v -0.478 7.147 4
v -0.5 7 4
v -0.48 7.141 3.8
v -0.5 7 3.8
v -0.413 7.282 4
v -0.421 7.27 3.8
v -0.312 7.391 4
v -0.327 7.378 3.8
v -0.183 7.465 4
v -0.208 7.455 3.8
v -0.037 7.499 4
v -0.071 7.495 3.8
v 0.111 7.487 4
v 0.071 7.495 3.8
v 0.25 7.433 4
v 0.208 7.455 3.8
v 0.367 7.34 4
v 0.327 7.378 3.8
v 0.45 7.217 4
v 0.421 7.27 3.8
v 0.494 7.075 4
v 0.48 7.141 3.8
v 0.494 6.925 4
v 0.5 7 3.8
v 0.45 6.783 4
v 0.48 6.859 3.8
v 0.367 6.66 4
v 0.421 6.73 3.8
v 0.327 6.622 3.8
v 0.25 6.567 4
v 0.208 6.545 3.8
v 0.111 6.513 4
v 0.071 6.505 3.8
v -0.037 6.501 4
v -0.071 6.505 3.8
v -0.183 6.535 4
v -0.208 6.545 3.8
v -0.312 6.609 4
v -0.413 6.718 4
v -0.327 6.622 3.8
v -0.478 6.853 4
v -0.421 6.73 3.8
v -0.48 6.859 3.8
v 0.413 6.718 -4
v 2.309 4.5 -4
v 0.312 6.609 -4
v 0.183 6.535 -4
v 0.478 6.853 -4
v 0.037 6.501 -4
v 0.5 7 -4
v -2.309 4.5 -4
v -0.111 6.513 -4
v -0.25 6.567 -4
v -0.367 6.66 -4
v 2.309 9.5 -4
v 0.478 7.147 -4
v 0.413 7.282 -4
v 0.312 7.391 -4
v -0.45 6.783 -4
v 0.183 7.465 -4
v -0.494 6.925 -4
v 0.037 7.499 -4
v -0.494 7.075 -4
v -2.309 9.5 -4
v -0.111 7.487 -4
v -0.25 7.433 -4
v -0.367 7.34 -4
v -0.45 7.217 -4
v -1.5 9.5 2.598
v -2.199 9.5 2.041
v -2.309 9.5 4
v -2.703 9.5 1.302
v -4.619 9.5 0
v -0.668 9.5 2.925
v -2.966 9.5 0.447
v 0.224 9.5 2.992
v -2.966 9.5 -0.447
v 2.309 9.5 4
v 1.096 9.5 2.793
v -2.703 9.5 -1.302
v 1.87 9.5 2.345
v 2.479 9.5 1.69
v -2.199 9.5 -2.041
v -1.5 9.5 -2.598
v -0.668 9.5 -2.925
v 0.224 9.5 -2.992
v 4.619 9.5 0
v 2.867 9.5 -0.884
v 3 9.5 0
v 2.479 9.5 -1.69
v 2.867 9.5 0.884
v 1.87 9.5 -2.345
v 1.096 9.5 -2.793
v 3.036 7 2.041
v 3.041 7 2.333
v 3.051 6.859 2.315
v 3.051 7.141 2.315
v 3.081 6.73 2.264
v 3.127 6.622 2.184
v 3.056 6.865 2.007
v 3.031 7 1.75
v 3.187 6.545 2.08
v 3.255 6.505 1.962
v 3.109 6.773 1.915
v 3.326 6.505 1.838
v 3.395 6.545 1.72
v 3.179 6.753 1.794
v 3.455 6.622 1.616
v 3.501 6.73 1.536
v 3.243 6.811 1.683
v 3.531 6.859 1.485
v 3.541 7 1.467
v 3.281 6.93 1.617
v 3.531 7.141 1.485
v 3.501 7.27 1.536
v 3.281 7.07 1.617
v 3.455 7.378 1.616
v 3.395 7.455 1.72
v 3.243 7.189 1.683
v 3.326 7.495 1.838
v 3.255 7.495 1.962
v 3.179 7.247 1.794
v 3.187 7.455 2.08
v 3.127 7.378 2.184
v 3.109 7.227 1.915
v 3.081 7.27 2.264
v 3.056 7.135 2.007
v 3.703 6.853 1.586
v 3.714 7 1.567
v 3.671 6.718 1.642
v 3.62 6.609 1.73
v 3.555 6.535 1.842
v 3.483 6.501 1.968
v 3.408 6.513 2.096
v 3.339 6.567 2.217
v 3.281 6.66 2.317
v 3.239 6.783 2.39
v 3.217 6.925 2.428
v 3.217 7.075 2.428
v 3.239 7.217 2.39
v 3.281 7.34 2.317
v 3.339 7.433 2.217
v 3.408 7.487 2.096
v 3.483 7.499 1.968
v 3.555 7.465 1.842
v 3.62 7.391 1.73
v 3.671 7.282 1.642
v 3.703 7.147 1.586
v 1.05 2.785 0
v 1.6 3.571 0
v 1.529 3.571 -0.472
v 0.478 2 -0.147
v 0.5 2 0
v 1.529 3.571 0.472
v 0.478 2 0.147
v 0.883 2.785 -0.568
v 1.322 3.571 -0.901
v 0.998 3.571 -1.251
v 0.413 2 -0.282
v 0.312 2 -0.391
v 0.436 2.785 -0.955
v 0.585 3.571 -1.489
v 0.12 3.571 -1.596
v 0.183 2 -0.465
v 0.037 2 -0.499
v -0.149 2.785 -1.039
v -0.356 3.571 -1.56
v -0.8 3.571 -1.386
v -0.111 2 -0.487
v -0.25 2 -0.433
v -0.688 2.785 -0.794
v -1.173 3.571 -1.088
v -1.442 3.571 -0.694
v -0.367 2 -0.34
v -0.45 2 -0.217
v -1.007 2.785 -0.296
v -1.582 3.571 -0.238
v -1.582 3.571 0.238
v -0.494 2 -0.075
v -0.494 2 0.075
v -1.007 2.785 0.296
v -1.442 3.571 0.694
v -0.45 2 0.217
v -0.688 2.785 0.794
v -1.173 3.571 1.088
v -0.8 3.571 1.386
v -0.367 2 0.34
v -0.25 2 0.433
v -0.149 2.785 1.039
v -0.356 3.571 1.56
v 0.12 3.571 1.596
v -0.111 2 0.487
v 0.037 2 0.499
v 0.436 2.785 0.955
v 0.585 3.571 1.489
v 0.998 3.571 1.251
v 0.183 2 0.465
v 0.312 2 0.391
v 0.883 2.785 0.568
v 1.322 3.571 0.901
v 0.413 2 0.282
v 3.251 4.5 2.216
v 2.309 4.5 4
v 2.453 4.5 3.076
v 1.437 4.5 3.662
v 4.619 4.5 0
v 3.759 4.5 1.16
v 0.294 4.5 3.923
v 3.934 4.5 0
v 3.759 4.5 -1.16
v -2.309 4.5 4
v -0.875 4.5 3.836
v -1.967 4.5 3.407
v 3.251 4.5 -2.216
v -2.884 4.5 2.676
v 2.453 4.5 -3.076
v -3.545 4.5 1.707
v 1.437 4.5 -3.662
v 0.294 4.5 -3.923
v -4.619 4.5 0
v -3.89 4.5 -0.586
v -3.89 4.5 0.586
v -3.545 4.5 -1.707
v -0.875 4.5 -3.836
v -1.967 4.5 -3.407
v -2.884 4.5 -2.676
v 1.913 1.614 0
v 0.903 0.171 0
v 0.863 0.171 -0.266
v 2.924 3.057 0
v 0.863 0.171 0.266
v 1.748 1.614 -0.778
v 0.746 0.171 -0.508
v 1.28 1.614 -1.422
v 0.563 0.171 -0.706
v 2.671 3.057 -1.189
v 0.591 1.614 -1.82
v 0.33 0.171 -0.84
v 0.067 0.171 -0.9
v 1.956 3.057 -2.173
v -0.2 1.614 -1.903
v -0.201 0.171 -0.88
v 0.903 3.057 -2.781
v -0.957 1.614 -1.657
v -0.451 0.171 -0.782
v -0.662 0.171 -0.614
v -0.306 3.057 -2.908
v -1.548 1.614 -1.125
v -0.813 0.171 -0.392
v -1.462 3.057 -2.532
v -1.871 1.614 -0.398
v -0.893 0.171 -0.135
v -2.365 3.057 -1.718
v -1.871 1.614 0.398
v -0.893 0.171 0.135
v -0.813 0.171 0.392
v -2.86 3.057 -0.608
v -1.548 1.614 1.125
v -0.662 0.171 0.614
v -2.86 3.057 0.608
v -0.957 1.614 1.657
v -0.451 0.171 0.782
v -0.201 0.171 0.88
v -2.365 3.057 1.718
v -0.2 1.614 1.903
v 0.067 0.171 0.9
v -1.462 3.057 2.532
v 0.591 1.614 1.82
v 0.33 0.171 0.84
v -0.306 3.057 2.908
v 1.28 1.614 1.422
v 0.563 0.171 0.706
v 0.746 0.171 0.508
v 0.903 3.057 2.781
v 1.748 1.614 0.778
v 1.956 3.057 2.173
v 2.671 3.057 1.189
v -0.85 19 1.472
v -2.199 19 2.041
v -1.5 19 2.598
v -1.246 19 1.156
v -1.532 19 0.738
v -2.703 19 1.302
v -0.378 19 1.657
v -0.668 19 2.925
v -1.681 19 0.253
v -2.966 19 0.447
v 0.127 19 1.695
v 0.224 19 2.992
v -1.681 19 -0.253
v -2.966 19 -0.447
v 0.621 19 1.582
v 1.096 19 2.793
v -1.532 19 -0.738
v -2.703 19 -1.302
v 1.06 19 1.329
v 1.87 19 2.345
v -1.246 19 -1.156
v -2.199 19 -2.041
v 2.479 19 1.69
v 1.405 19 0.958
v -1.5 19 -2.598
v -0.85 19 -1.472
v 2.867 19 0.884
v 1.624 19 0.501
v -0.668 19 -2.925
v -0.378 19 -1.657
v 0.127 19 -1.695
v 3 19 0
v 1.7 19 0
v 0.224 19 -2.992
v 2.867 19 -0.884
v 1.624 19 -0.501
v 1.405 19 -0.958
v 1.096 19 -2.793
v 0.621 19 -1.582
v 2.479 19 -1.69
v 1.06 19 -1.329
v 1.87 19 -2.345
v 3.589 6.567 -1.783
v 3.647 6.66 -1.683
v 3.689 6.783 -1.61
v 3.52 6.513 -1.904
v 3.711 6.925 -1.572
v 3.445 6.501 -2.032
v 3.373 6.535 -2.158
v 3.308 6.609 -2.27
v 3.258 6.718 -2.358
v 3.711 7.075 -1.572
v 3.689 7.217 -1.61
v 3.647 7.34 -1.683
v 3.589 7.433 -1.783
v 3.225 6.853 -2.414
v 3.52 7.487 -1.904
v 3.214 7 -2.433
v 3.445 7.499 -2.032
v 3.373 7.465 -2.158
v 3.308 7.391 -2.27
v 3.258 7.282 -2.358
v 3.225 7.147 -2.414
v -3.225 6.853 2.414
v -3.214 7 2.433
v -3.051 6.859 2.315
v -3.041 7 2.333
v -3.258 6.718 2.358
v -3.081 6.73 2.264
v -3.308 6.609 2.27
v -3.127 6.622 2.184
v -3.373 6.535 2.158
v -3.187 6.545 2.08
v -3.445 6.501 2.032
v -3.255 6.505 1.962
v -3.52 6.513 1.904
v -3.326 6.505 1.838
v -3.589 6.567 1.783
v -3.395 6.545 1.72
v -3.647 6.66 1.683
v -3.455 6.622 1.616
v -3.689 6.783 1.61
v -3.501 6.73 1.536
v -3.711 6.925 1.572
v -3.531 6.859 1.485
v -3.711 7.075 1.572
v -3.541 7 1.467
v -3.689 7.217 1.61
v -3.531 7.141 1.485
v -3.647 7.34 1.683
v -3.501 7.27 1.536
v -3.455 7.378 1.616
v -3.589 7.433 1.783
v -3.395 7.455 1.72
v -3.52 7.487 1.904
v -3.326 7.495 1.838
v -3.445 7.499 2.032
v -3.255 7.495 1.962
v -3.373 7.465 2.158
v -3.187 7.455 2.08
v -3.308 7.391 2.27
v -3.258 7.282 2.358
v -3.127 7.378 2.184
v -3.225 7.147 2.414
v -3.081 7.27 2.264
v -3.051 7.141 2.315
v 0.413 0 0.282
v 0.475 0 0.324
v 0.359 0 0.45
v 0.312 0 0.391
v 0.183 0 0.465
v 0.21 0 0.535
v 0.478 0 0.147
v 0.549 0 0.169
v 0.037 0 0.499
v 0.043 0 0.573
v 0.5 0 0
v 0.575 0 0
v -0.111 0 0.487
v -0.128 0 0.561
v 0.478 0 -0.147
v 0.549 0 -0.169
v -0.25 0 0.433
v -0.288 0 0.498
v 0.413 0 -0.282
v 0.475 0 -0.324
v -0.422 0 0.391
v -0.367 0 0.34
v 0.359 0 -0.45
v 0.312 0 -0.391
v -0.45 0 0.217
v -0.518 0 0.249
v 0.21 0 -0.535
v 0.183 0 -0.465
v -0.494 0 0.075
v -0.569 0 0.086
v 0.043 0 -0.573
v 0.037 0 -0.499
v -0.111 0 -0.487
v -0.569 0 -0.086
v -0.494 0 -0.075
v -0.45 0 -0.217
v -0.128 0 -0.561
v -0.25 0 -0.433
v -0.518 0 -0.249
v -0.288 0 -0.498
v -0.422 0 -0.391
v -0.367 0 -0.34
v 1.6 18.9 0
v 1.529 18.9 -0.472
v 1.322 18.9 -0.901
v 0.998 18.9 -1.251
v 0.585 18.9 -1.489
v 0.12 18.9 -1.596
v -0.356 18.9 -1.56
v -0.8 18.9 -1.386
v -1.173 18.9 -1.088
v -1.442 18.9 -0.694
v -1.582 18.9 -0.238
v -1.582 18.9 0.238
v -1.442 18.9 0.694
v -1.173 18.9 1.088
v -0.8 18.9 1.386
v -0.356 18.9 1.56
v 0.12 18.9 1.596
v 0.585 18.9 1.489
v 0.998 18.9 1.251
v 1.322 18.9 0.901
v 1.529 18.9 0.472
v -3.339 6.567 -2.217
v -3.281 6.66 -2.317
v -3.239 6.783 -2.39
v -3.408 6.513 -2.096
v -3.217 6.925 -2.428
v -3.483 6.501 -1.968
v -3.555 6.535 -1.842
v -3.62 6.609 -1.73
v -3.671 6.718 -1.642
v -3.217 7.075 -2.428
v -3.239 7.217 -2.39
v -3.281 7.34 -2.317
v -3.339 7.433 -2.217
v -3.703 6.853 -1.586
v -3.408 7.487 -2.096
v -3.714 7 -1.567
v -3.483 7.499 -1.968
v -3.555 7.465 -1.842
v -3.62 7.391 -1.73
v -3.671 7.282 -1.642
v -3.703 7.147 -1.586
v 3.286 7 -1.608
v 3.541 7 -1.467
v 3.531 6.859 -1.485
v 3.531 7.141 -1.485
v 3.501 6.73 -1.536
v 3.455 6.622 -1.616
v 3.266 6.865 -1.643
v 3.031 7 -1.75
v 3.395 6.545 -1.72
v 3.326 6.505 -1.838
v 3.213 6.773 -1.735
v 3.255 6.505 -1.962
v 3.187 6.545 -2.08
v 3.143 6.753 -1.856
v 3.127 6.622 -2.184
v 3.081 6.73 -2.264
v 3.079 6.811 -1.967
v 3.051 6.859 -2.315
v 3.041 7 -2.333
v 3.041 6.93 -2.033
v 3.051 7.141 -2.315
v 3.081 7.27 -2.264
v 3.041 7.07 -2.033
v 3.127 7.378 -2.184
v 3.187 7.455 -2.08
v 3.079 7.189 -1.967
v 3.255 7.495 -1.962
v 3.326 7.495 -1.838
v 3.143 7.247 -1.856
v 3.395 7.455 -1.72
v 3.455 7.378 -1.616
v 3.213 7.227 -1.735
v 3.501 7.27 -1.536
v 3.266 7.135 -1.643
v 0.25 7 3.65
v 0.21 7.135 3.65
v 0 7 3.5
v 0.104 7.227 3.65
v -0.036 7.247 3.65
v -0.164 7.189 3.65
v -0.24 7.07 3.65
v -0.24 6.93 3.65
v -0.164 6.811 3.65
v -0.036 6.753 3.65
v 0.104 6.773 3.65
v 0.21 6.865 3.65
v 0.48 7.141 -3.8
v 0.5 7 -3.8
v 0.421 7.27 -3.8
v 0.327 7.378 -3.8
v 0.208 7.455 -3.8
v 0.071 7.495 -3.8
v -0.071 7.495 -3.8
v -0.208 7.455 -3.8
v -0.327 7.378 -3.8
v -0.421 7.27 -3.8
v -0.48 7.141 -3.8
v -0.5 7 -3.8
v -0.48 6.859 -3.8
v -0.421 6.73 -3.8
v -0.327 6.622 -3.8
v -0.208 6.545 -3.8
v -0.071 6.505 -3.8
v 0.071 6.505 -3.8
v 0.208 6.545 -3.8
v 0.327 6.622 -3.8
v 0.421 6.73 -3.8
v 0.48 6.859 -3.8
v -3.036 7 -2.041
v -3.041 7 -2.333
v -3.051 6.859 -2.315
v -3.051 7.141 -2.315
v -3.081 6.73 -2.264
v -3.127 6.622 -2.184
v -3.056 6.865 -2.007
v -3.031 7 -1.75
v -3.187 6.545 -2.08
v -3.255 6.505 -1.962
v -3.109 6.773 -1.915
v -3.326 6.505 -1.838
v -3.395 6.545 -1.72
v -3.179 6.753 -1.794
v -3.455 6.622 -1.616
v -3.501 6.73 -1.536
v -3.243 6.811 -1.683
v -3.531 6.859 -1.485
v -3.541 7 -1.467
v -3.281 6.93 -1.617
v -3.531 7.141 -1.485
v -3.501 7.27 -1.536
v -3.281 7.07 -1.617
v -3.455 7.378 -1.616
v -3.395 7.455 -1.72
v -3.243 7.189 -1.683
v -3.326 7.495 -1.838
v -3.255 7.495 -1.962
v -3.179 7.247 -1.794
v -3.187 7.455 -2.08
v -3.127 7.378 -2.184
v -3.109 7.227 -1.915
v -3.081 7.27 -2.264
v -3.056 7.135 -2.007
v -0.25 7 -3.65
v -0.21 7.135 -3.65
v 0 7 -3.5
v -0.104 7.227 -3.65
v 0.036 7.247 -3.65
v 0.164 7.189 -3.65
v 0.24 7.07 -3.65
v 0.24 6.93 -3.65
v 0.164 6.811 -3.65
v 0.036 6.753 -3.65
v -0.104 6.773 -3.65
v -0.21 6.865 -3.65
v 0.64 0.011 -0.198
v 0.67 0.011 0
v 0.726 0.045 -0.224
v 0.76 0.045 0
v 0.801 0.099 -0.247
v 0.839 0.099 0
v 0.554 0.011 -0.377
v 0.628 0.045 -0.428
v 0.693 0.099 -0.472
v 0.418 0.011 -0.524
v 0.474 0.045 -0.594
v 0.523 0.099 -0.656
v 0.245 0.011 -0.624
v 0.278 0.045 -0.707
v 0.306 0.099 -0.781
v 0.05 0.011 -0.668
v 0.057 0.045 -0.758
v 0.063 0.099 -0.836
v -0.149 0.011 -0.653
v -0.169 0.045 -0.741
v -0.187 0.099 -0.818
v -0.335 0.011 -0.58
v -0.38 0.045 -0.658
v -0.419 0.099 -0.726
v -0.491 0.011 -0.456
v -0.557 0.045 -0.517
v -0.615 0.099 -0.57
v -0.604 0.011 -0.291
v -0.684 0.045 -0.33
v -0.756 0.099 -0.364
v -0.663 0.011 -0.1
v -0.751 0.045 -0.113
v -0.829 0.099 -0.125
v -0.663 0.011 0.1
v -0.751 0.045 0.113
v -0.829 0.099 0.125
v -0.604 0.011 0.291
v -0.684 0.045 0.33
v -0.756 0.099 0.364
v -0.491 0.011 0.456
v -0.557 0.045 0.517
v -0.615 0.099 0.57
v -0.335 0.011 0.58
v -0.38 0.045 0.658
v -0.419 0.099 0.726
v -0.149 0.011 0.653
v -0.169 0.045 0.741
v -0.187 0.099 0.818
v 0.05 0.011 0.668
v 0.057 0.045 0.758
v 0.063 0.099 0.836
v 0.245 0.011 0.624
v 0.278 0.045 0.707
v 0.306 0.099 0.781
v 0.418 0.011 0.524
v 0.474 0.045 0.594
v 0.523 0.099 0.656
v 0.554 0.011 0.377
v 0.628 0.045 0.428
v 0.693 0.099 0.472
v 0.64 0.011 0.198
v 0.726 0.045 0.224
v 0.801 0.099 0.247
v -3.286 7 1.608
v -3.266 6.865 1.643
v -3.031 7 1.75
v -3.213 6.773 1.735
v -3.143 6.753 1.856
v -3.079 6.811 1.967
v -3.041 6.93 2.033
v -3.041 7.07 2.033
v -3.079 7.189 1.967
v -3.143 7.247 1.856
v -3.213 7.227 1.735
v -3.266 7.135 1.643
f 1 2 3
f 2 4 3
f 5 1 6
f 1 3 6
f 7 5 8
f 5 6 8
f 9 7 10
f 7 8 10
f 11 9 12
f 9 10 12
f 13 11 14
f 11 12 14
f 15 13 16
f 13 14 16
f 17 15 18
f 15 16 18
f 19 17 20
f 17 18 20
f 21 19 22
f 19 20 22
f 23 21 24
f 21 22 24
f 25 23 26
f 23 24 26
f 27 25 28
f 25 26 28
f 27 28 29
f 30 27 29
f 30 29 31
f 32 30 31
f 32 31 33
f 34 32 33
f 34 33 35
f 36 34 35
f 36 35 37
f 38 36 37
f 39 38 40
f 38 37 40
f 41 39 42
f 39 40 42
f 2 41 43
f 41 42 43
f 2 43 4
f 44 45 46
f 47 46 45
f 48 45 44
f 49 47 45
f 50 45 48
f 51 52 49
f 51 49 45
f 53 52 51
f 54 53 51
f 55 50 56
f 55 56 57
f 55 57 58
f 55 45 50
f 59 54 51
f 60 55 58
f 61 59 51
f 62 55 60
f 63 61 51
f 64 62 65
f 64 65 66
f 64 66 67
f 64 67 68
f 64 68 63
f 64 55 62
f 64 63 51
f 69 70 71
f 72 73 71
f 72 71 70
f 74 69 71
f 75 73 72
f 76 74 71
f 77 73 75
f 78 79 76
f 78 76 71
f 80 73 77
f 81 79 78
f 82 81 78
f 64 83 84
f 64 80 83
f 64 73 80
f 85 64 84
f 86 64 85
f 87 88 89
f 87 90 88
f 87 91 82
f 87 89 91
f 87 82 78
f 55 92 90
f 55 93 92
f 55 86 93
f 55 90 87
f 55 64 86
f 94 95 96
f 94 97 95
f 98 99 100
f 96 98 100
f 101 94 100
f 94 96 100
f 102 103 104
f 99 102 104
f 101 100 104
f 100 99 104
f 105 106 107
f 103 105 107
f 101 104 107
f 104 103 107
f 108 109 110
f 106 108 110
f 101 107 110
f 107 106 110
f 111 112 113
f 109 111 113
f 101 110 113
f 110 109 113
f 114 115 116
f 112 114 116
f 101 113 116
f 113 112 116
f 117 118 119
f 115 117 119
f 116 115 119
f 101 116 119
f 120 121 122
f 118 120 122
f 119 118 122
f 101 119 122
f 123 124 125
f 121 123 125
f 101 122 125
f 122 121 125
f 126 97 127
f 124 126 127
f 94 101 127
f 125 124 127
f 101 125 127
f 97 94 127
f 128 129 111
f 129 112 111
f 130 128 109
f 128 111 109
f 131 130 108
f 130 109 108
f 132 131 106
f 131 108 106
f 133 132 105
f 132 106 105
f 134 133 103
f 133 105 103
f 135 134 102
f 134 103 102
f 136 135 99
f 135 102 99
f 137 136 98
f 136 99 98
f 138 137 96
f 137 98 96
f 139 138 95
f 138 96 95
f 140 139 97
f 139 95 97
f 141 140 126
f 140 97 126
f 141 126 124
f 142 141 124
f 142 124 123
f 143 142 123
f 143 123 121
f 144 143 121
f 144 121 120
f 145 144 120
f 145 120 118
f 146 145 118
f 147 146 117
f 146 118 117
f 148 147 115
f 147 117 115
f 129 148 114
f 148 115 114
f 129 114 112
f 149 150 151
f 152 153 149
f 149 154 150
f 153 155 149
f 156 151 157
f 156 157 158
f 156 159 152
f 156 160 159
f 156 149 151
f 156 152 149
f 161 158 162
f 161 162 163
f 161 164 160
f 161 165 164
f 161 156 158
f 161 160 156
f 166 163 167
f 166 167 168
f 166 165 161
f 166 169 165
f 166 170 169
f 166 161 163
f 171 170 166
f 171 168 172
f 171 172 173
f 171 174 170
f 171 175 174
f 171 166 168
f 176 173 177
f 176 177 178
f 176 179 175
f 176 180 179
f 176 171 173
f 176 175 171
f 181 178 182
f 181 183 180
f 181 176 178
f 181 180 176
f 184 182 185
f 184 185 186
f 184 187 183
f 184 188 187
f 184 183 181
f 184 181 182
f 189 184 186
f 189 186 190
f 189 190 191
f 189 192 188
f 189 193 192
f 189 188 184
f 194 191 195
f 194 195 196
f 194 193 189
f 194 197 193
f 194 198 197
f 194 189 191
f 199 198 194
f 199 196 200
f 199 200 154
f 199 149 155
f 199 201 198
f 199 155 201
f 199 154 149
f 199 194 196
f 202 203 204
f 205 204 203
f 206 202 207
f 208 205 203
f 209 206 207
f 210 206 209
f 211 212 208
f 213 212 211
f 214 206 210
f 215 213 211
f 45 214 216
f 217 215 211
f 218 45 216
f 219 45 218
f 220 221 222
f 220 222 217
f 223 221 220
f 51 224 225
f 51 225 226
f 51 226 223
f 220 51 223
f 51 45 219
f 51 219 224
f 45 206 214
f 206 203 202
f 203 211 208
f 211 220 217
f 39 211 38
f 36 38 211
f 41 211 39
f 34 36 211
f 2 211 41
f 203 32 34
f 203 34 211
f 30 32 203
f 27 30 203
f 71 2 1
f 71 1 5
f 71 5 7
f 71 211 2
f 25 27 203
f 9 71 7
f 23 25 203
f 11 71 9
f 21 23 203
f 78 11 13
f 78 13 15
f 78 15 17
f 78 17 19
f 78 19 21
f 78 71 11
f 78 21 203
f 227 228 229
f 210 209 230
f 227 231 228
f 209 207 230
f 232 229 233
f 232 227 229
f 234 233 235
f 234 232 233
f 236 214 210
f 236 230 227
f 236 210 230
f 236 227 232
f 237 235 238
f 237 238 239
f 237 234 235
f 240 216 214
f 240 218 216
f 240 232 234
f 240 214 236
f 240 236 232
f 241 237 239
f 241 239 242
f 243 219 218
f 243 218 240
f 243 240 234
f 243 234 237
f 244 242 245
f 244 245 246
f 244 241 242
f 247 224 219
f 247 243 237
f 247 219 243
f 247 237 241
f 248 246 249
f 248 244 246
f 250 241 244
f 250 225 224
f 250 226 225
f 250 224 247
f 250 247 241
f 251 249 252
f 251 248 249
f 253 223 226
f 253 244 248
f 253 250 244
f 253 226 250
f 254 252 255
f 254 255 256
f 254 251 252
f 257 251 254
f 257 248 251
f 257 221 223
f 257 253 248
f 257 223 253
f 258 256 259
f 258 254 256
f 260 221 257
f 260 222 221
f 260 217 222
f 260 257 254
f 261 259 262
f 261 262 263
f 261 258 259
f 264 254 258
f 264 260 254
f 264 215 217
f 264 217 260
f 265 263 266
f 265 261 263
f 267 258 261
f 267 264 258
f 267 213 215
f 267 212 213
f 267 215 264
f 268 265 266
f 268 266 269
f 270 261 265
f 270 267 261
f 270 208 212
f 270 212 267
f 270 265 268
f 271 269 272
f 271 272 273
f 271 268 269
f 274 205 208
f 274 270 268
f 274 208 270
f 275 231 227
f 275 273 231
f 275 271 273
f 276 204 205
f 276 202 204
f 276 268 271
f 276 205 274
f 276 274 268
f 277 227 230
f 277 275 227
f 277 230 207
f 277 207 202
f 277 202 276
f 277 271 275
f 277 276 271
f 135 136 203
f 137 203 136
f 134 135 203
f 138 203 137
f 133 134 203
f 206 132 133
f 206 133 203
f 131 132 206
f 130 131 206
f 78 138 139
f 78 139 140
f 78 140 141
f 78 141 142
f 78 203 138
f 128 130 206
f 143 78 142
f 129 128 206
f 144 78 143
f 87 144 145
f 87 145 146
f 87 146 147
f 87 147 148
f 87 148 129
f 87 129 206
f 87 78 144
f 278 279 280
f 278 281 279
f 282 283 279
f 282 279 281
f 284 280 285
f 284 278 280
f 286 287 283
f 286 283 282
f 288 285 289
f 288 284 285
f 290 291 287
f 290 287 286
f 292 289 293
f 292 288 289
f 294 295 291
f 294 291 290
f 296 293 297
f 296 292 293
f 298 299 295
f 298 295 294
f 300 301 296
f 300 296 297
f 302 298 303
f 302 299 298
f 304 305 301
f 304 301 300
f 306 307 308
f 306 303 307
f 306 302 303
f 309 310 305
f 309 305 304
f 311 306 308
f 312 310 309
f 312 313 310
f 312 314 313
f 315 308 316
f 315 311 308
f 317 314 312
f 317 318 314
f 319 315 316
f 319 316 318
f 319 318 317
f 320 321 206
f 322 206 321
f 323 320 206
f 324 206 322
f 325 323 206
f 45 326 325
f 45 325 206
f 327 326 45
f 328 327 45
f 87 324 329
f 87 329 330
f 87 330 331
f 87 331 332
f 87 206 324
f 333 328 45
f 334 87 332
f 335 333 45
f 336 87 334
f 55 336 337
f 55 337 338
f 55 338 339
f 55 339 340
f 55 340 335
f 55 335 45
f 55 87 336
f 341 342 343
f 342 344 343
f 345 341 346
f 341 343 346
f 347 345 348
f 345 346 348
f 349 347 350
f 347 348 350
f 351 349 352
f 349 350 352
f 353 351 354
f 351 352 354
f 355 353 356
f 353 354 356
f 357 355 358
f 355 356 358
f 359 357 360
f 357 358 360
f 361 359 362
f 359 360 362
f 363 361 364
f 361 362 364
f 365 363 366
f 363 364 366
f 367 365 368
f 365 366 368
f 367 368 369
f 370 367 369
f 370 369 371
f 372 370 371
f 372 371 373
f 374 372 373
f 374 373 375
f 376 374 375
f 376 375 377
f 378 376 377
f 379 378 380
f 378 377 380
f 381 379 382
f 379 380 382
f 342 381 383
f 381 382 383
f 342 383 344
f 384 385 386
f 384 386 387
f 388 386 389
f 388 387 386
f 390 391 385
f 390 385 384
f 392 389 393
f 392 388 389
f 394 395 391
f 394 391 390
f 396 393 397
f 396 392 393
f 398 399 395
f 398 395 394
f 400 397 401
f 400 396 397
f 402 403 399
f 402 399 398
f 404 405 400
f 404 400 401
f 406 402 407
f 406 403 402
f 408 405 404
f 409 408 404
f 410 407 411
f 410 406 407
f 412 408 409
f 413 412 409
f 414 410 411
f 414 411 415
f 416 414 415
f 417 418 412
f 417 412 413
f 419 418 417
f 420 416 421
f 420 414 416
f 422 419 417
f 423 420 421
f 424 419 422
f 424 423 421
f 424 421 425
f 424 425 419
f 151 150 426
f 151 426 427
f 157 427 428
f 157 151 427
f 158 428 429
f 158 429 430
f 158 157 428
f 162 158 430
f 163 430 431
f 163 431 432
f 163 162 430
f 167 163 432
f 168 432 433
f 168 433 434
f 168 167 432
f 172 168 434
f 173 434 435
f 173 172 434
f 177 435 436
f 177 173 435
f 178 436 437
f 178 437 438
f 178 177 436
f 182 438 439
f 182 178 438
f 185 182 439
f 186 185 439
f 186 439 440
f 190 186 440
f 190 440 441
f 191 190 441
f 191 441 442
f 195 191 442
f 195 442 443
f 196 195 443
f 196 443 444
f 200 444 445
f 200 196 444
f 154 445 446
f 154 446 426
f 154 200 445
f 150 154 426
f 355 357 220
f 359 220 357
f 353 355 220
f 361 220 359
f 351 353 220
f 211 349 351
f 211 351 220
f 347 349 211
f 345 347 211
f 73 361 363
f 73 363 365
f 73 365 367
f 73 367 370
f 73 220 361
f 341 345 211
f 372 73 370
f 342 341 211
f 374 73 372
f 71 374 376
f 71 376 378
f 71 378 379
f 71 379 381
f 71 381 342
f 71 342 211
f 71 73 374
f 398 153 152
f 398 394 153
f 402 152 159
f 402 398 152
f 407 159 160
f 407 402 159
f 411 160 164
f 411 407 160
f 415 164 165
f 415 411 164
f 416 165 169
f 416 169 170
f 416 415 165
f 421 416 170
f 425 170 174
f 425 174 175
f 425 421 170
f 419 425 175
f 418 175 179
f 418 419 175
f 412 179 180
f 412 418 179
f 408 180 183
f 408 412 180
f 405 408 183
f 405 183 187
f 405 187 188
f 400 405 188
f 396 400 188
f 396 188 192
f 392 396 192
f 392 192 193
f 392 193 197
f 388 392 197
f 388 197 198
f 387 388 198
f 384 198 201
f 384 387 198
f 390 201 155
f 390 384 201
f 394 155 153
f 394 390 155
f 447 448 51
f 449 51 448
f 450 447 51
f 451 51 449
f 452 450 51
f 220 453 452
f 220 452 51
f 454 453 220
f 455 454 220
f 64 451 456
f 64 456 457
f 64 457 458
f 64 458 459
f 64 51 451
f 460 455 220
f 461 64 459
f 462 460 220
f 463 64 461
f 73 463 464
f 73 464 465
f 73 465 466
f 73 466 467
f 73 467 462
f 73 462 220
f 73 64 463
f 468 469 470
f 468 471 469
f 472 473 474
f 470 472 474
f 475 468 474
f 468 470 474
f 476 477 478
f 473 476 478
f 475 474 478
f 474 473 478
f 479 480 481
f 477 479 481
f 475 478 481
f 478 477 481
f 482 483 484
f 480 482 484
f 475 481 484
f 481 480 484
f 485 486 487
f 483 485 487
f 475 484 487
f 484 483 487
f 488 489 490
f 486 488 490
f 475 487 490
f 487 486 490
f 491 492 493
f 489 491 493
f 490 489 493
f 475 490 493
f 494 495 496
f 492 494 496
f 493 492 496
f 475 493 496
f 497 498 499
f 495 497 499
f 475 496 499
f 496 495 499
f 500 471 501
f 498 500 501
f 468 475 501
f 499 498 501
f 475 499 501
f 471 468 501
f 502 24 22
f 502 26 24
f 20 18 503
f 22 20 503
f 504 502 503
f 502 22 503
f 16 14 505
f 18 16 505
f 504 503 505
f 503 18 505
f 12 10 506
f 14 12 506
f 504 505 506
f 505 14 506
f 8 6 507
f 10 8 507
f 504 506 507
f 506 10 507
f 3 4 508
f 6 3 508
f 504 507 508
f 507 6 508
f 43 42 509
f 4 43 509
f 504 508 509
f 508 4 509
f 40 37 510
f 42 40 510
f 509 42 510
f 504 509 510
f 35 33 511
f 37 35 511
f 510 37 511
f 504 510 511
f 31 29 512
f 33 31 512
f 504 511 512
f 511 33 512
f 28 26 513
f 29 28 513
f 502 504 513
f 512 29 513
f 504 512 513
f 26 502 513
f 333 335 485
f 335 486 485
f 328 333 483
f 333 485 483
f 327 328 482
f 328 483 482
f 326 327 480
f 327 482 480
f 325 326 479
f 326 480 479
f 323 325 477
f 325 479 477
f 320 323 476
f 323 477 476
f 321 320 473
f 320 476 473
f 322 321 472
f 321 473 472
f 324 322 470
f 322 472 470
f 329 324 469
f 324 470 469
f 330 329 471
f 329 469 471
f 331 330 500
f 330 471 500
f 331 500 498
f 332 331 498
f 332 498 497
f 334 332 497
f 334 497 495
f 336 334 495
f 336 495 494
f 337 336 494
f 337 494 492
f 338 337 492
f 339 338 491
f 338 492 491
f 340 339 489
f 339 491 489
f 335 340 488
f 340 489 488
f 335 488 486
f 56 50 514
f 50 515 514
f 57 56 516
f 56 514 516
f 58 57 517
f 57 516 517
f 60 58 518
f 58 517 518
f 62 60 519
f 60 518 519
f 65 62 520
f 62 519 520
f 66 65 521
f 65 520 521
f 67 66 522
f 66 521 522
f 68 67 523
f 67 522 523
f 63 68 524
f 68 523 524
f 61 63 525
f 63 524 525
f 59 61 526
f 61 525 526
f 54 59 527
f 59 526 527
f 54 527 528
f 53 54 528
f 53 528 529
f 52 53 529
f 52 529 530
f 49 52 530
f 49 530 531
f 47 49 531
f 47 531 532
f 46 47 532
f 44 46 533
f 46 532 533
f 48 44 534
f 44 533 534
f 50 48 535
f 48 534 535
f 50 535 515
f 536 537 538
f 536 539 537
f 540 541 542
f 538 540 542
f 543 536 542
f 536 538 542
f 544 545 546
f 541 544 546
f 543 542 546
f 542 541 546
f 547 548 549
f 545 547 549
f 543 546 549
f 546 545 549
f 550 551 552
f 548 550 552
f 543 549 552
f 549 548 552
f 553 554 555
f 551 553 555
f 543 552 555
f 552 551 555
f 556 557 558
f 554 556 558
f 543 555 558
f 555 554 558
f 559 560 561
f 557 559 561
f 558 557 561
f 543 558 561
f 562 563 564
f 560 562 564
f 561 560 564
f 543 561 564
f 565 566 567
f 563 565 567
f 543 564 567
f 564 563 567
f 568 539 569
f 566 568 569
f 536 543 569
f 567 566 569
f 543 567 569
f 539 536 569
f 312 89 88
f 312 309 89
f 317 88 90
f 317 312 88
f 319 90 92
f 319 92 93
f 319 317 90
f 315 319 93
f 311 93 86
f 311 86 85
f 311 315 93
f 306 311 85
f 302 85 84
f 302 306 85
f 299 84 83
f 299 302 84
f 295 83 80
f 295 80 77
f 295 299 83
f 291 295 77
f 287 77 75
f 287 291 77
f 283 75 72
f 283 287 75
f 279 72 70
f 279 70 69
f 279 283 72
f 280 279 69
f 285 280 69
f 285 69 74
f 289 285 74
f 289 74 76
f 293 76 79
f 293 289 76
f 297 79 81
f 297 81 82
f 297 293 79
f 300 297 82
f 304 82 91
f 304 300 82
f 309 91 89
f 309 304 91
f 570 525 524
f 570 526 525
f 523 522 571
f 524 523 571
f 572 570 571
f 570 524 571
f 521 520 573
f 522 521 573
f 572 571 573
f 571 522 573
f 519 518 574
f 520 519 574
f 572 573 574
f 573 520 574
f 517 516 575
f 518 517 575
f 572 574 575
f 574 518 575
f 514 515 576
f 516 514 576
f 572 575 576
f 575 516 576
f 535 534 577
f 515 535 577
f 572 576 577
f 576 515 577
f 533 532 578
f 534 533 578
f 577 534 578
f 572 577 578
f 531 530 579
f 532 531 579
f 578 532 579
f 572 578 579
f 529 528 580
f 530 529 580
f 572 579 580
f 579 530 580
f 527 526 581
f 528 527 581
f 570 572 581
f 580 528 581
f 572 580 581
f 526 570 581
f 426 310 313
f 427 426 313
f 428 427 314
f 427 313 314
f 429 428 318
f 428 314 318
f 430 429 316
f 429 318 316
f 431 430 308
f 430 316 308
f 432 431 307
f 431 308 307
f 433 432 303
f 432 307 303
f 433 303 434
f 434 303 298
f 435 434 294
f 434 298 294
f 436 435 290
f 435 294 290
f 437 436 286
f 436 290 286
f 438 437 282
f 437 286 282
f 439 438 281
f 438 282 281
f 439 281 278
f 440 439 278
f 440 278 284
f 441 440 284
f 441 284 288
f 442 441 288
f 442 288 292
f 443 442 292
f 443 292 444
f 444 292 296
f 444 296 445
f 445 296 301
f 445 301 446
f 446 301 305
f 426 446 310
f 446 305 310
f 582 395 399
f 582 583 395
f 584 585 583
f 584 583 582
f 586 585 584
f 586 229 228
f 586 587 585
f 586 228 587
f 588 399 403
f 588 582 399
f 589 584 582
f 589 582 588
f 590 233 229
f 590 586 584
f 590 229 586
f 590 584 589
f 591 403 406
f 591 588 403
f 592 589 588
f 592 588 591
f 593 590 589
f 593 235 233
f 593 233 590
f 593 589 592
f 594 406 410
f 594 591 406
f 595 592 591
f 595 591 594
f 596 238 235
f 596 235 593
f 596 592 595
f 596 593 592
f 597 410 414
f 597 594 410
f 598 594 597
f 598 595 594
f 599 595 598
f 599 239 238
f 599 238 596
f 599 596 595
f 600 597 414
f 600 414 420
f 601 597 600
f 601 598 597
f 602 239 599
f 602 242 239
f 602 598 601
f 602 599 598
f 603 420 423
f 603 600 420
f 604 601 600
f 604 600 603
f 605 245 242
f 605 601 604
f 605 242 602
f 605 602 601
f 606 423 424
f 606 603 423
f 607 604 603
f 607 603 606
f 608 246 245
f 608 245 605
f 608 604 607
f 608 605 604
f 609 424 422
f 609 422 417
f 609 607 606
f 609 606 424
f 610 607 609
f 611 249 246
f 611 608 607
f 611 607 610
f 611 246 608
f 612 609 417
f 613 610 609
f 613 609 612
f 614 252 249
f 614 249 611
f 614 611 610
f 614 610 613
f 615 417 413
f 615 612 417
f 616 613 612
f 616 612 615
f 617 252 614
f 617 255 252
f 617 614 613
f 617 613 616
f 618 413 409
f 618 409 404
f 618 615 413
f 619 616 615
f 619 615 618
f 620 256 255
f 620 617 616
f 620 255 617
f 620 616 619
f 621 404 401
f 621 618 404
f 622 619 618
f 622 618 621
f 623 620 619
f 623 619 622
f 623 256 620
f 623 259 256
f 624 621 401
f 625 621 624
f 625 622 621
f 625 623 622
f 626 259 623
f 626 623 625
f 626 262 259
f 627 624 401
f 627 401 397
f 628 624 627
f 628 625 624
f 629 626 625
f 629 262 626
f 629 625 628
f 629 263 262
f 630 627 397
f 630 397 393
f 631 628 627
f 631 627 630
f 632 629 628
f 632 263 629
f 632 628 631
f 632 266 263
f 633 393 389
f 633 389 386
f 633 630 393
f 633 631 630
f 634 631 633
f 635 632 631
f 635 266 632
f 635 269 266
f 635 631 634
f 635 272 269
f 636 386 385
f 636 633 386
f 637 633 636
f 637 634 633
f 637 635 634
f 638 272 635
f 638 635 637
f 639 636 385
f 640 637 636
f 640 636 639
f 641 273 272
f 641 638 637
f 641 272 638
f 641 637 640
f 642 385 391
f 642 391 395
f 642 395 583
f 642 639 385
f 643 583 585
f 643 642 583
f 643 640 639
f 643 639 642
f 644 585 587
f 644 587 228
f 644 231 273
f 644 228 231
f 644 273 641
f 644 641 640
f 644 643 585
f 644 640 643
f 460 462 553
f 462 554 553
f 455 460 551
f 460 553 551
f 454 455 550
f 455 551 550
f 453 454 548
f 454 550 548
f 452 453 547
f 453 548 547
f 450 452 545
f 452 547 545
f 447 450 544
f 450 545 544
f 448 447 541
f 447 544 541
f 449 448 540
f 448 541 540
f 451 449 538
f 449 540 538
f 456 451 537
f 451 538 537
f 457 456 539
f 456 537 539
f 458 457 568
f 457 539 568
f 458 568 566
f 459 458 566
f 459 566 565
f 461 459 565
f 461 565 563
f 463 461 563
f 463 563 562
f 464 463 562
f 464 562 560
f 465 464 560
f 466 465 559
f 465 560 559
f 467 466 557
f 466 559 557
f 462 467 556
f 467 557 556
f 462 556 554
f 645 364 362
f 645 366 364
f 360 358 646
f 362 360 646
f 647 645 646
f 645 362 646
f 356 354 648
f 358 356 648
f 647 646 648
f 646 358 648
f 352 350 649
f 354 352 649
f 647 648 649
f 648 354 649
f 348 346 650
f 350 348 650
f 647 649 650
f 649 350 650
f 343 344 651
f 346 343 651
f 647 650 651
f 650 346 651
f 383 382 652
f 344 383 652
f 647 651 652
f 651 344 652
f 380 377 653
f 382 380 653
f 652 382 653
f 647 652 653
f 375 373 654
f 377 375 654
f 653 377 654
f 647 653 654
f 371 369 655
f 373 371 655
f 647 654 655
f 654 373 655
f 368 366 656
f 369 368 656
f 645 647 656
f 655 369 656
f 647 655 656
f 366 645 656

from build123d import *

# Parameters (mm, degrees)
CORTAR_EXTRUIR1_START                       = 1
CROQUIS2_R                                  = 7.435198433
CORTAR_EXTRUIR1_DEPTH                       = 7
CHAFL_N1_SIZE                               = 0.1
DI_METRO_DE_TALADRO_1_0_1_1_D               = 1
DI_METRO_DE_TALADRO_1_0_1_1_DEPTH           = 0.2
DI_METRO_DE_TALADRO_1_0_1_1_TIP             = 0.30043031
DI_METRO_DE_TALADRO_1_0_1_1_ON_FACE_2_D     = 1
DI_METRO_DE_TALADRO_1_0_1_1_ON_FACE_2_DEPTH = 0.2
DI_METRO_DE_TALADRO_1_0_1_1_ON_FACE_2_TIP   = 0.30043031
DI_METRO_DE_TALADRO_1_0_1_1_ON_FACE_3_D     = 1
DI_METRO_DE_TALADRO_1_0_1_1_ON_FACE_3_DEPTH = 0.2
DI_METRO_DE_TALADRO_1_0_1_1_ON_FACE_3_TIP   = 0.30043031
DI_METRO_DE_TALADRO_1_0_1_1_ON_FACE_4_D     = 1
DI_METRO_DE_TALADRO_1_0_1_1_ON_FACE_4_DEPTH = 0.2
DI_METRO_DE_TALADRO_1_0_1_1_ON_FACE_4_TIP   = 0.30043031
DI_METRO_DE_TALADRO_1_0_1_1_ON_FACE_5_D     = 1
DI_METRO_DE_TALADRO_1_0_1_1_ON_FACE_5_DEPTH = 0.2
DI_METRO_DE_TALADRO_1_0_1_1_ON_FACE_5_TIP   = 0.30043031
DI_METRO_DE_TALADRO_1_0_1_1_ON_FACE_6_D     = 1
DI_METRO_DE_TALADRO_1_0_1_1_ON_FACE_6_DEPTH = 0.2
DI_METRO_DE_TALADRO_1_0_1_1_ON_FACE_6_TIP   = 0.30043031


with BuildPart() as part:
    # Croquis1 → Revolución1 (revolve)
    with BuildSketch(Plane.XY):
        with BuildLine():
            Line((0.5, 0), (0.575, 0))
            ThreePointArc((0.575, 0), (0.759699445, 0.045195667), (0.902660818, 0.170569425))
            Line((0.902660818, 0.170569425), (3.934160742, 4.5))
            Line((3.934160742, 4.5), (6.64058638, 4.5))
            Line((6.64058638, 4.5), (6.64058638, 8.36517638))
            Line((6.64058638, 8.36517638), (7.435198433, 9.5))
            Line((7.435198433, 9.5), (3, 9.5))
            Line((3, 9.5), (3, 19))
            Line((3, 19), (1.6, 19))
            Line((1.6, 19), (1.6, 3.570962807))
            Line((1.6, 3.570962807), (0.5, 2))
            Line((0.5, 2), (0.5, 0))
        make_face()
    revolve(axis=Axis((0, 0, 0), (0, 1, 0)))

    # Croquis2 → Cortar-Extruir1 (cut)
    with BuildSketch(Plane(origin=(0, 9.5, 0), x_dir=(1, 0, 0), z_dir=(0, 1, 0)).offset(CORTAR_EXTRUIR1_START)):
        Circle(CROQUIS2_R)
        Polygon((2.309401077, 4), (-2.309401077, 4), (-4.618802154, 0), (-2.309401077, -4), (2.309401077, -4), (4.618802154, 0), align=None, mode=Mode.SUBTRACT)
    extrude(amount=-CORTAR_EXTRUIR1_DEPTH, mode=Mode.SUBTRACT)

    # Chaflán1
    chafl_n1_edges = [part.edges().sort_by_distance(p)[0] for p in [
        (-1.6, 19, 0),
    ]]
    chamfer(chafl_n1_edges, length=CHAFL_N1_SIZE)

    # Diámetro de taladro Ø1.0 (1)1
    with Locations(Plane(origin=(0, 7, 4), x_dir=(1, 0, 0), z_dir=(0, 0, 1))):
        with Locations((0, 0)):
            Hole(DI_METRO_DE_TALADRO_1_0_1_1_D / 2, depth=DI_METRO_DE_TALADRO_1_0_1_1_DEPTH)
            with Locations((0, 0, -(DI_METRO_DE_TALADRO_1_0_1_1_DEPTH + DI_METRO_DE_TALADRO_1_0_1_1_TIP / 2))):  # 118° drill point
                Cone(0, DI_METRO_DE_TALADRO_1_0_1_1_D / 2, DI_METRO_DE_TALADRO_1_0_1_1_TIP, mode=Mode.SUBTRACT)

    # Diámetro de taladro Ø1.0 (1)1 on face 2
    with Locations(Plane(origin=(3.464101615, 7, 2), x_dir=(-0.500000175, 0, 0.866025303), z_dir=(0.866025303, 0, 0.500000175))):
        with Locations((0, 0)):
            Hole(DI_METRO_DE_TALADRO_1_0_1_1_ON_FACE_2_D / 2, depth=DI_METRO_DE_TALADRO_1_0_1_1_ON_FACE_2_DEPTH)
            with Locations((0, 0, -(DI_METRO_DE_TALADRO_1_0_1_1_ON_FACE_2_DEPTH + DI_METRO_DE_TALADRO_1_0_1_1_ON_FACE_2_TIP / 2))):  # 118° drill point
                Cone(0, DI_METRO_DE_TALADRO_1_0_1_1_ON_FACE_2_D / 2, DI_METRO_DE_TALADRO_1_0_1_1_ON_FACE_2_TIP, mode=Mode.SUBTRACT)

    # Diámetro de taladro Ø1.0 (1)1 on face 3
    with Locations(Plane(origin=(3.464101615, 7, -2), x_dir=(0.500000175, 0, 0.866025303), z_dir=(0.866025303, 0, -0.500000175))):
        with Locations((0, 0)):
            Hole(DI_METRO_DE_TALADRO_1_0_1_1_ON_FACE_3_D / 2, depth=DI_METRO_DE_TALADRO_1_0_1_1_ON_FACE_3_DEPTH)
            with Locations((0, 0, -(DI_METRO_DE_TALADRO_1_0_1_1_ON_FACE_3_DEPTH + DI_METRO_DE_TALADRO_1_0_1_1_ON_FACE_3_TIP / 2))):  # 118° drill point
                Cone(0, DI_METRO_DE_TALADRO_1_0_1_1_ON_FACE_3_D / 2, DI_METRO_DE_TALADRO_1_0_1_1_ON_FACE_3_TIP, mode=Mode.SUBTRACT)

    # Diámetro de taladro Ø1.0 (1)1 on face 4
    with Locations(Plane(origin=(0, 7, -4), x_dir=(-1, 0, 0), z_dir=(0, 0, -1))):
        with Locations((0, 0)):
            Hole(DI_METRO_DE_TALADRO_1_0_1_1_ON_FACE_4_D / 2, depth=DI_METRO_DE_TALADRO_1_0_1_1_ON_FACE_4_DEPTH)
            with Locations((0, 0, -(DI_METRO_DE_TALADRO_1_0_1_1_ON_FACE_4_DEPTH + DI_METRO_DE_TALADRO_1_0_1_1_ON_FACE_4_TIP / 2))):  # 118° drill point
                Cone(0, DI_METRO_DE_TALADRO_1_0_1_1_ON_FACE_4_D / 2, DI_METRO_DE_TALADRO_1_0_1_1_ON_FACE_4_TIP, mode=Mode.SUBTRACT)

    # Diámetro de taladro Ø1.0 (1)1 on face 5
    with Locations(Plane(origin=(-3.464101615, 7, -2), x_dir=(0.500000175, 0, -0.866025303), z_dir=(-0.866025303, 0, -0.500000175))):
        with Locations((0, 0)):
            Hole(DI_METRO_DE_TALADRO_1_0_1_1_ON_FACE_5_D / 2, depth=DI_METRO_DE_TALADRO_1_0_1_1_ON_FACE_5_DEPTH)
            with Locations((0, 0, -(DI_METRO_DE_TALADRO_1_0_1_1_ON_FACE_5_DEPTH + DI_METRO_DE_TALADRO_1_0_1_1_ON_FACE_5_TIP / 2))):  # 118° drill point
                Cone(0, DI_METRO_DE_TALADRO_1_0_1_1_ON_FACE_5_D / 2, DI_METRO_DE_TALADRO_1_0_1_1_ON_FACE_5_TIP, mode=Mode.SUBTRACT)

    # Diámetro de taladro Ø1.0 (1)1 on face 6
    with Locations(Plane(origin=(-3.464101615, 7, 2), x_dir=(-0.500000175, 0, -0.866025303), z_dir=(-0.866025303, 0, 0.500000175))):
        with Locations((0, 0)):
            Hole(DI_METRO_DE_TALADRO_1_0_1_1_ON_FACE_6_D / 2, depth=DI_METRO_DE_TALADRO_1_0_1_1_ON_FACE_6_DEPTH)
            with Locations((0, 0, -(DI_METRO_DE_TALADRO_1_0_1_1_ON_FACE_6_DEPTH + DI_METRO_DE_TALADRO_1_0_1_1_ON_FACE_6_TIP / 2))):  # 118° drill point
                Cone(0, DI_METRO_DE_TALADRO_1_0_1_1_ON_FACE_6_D / 2, DI_METRO_DE_TALADRO_1_0_1_1_ON_FACE_6_TIP, mode=Mode.SUBTRACT)


solid = part.part
